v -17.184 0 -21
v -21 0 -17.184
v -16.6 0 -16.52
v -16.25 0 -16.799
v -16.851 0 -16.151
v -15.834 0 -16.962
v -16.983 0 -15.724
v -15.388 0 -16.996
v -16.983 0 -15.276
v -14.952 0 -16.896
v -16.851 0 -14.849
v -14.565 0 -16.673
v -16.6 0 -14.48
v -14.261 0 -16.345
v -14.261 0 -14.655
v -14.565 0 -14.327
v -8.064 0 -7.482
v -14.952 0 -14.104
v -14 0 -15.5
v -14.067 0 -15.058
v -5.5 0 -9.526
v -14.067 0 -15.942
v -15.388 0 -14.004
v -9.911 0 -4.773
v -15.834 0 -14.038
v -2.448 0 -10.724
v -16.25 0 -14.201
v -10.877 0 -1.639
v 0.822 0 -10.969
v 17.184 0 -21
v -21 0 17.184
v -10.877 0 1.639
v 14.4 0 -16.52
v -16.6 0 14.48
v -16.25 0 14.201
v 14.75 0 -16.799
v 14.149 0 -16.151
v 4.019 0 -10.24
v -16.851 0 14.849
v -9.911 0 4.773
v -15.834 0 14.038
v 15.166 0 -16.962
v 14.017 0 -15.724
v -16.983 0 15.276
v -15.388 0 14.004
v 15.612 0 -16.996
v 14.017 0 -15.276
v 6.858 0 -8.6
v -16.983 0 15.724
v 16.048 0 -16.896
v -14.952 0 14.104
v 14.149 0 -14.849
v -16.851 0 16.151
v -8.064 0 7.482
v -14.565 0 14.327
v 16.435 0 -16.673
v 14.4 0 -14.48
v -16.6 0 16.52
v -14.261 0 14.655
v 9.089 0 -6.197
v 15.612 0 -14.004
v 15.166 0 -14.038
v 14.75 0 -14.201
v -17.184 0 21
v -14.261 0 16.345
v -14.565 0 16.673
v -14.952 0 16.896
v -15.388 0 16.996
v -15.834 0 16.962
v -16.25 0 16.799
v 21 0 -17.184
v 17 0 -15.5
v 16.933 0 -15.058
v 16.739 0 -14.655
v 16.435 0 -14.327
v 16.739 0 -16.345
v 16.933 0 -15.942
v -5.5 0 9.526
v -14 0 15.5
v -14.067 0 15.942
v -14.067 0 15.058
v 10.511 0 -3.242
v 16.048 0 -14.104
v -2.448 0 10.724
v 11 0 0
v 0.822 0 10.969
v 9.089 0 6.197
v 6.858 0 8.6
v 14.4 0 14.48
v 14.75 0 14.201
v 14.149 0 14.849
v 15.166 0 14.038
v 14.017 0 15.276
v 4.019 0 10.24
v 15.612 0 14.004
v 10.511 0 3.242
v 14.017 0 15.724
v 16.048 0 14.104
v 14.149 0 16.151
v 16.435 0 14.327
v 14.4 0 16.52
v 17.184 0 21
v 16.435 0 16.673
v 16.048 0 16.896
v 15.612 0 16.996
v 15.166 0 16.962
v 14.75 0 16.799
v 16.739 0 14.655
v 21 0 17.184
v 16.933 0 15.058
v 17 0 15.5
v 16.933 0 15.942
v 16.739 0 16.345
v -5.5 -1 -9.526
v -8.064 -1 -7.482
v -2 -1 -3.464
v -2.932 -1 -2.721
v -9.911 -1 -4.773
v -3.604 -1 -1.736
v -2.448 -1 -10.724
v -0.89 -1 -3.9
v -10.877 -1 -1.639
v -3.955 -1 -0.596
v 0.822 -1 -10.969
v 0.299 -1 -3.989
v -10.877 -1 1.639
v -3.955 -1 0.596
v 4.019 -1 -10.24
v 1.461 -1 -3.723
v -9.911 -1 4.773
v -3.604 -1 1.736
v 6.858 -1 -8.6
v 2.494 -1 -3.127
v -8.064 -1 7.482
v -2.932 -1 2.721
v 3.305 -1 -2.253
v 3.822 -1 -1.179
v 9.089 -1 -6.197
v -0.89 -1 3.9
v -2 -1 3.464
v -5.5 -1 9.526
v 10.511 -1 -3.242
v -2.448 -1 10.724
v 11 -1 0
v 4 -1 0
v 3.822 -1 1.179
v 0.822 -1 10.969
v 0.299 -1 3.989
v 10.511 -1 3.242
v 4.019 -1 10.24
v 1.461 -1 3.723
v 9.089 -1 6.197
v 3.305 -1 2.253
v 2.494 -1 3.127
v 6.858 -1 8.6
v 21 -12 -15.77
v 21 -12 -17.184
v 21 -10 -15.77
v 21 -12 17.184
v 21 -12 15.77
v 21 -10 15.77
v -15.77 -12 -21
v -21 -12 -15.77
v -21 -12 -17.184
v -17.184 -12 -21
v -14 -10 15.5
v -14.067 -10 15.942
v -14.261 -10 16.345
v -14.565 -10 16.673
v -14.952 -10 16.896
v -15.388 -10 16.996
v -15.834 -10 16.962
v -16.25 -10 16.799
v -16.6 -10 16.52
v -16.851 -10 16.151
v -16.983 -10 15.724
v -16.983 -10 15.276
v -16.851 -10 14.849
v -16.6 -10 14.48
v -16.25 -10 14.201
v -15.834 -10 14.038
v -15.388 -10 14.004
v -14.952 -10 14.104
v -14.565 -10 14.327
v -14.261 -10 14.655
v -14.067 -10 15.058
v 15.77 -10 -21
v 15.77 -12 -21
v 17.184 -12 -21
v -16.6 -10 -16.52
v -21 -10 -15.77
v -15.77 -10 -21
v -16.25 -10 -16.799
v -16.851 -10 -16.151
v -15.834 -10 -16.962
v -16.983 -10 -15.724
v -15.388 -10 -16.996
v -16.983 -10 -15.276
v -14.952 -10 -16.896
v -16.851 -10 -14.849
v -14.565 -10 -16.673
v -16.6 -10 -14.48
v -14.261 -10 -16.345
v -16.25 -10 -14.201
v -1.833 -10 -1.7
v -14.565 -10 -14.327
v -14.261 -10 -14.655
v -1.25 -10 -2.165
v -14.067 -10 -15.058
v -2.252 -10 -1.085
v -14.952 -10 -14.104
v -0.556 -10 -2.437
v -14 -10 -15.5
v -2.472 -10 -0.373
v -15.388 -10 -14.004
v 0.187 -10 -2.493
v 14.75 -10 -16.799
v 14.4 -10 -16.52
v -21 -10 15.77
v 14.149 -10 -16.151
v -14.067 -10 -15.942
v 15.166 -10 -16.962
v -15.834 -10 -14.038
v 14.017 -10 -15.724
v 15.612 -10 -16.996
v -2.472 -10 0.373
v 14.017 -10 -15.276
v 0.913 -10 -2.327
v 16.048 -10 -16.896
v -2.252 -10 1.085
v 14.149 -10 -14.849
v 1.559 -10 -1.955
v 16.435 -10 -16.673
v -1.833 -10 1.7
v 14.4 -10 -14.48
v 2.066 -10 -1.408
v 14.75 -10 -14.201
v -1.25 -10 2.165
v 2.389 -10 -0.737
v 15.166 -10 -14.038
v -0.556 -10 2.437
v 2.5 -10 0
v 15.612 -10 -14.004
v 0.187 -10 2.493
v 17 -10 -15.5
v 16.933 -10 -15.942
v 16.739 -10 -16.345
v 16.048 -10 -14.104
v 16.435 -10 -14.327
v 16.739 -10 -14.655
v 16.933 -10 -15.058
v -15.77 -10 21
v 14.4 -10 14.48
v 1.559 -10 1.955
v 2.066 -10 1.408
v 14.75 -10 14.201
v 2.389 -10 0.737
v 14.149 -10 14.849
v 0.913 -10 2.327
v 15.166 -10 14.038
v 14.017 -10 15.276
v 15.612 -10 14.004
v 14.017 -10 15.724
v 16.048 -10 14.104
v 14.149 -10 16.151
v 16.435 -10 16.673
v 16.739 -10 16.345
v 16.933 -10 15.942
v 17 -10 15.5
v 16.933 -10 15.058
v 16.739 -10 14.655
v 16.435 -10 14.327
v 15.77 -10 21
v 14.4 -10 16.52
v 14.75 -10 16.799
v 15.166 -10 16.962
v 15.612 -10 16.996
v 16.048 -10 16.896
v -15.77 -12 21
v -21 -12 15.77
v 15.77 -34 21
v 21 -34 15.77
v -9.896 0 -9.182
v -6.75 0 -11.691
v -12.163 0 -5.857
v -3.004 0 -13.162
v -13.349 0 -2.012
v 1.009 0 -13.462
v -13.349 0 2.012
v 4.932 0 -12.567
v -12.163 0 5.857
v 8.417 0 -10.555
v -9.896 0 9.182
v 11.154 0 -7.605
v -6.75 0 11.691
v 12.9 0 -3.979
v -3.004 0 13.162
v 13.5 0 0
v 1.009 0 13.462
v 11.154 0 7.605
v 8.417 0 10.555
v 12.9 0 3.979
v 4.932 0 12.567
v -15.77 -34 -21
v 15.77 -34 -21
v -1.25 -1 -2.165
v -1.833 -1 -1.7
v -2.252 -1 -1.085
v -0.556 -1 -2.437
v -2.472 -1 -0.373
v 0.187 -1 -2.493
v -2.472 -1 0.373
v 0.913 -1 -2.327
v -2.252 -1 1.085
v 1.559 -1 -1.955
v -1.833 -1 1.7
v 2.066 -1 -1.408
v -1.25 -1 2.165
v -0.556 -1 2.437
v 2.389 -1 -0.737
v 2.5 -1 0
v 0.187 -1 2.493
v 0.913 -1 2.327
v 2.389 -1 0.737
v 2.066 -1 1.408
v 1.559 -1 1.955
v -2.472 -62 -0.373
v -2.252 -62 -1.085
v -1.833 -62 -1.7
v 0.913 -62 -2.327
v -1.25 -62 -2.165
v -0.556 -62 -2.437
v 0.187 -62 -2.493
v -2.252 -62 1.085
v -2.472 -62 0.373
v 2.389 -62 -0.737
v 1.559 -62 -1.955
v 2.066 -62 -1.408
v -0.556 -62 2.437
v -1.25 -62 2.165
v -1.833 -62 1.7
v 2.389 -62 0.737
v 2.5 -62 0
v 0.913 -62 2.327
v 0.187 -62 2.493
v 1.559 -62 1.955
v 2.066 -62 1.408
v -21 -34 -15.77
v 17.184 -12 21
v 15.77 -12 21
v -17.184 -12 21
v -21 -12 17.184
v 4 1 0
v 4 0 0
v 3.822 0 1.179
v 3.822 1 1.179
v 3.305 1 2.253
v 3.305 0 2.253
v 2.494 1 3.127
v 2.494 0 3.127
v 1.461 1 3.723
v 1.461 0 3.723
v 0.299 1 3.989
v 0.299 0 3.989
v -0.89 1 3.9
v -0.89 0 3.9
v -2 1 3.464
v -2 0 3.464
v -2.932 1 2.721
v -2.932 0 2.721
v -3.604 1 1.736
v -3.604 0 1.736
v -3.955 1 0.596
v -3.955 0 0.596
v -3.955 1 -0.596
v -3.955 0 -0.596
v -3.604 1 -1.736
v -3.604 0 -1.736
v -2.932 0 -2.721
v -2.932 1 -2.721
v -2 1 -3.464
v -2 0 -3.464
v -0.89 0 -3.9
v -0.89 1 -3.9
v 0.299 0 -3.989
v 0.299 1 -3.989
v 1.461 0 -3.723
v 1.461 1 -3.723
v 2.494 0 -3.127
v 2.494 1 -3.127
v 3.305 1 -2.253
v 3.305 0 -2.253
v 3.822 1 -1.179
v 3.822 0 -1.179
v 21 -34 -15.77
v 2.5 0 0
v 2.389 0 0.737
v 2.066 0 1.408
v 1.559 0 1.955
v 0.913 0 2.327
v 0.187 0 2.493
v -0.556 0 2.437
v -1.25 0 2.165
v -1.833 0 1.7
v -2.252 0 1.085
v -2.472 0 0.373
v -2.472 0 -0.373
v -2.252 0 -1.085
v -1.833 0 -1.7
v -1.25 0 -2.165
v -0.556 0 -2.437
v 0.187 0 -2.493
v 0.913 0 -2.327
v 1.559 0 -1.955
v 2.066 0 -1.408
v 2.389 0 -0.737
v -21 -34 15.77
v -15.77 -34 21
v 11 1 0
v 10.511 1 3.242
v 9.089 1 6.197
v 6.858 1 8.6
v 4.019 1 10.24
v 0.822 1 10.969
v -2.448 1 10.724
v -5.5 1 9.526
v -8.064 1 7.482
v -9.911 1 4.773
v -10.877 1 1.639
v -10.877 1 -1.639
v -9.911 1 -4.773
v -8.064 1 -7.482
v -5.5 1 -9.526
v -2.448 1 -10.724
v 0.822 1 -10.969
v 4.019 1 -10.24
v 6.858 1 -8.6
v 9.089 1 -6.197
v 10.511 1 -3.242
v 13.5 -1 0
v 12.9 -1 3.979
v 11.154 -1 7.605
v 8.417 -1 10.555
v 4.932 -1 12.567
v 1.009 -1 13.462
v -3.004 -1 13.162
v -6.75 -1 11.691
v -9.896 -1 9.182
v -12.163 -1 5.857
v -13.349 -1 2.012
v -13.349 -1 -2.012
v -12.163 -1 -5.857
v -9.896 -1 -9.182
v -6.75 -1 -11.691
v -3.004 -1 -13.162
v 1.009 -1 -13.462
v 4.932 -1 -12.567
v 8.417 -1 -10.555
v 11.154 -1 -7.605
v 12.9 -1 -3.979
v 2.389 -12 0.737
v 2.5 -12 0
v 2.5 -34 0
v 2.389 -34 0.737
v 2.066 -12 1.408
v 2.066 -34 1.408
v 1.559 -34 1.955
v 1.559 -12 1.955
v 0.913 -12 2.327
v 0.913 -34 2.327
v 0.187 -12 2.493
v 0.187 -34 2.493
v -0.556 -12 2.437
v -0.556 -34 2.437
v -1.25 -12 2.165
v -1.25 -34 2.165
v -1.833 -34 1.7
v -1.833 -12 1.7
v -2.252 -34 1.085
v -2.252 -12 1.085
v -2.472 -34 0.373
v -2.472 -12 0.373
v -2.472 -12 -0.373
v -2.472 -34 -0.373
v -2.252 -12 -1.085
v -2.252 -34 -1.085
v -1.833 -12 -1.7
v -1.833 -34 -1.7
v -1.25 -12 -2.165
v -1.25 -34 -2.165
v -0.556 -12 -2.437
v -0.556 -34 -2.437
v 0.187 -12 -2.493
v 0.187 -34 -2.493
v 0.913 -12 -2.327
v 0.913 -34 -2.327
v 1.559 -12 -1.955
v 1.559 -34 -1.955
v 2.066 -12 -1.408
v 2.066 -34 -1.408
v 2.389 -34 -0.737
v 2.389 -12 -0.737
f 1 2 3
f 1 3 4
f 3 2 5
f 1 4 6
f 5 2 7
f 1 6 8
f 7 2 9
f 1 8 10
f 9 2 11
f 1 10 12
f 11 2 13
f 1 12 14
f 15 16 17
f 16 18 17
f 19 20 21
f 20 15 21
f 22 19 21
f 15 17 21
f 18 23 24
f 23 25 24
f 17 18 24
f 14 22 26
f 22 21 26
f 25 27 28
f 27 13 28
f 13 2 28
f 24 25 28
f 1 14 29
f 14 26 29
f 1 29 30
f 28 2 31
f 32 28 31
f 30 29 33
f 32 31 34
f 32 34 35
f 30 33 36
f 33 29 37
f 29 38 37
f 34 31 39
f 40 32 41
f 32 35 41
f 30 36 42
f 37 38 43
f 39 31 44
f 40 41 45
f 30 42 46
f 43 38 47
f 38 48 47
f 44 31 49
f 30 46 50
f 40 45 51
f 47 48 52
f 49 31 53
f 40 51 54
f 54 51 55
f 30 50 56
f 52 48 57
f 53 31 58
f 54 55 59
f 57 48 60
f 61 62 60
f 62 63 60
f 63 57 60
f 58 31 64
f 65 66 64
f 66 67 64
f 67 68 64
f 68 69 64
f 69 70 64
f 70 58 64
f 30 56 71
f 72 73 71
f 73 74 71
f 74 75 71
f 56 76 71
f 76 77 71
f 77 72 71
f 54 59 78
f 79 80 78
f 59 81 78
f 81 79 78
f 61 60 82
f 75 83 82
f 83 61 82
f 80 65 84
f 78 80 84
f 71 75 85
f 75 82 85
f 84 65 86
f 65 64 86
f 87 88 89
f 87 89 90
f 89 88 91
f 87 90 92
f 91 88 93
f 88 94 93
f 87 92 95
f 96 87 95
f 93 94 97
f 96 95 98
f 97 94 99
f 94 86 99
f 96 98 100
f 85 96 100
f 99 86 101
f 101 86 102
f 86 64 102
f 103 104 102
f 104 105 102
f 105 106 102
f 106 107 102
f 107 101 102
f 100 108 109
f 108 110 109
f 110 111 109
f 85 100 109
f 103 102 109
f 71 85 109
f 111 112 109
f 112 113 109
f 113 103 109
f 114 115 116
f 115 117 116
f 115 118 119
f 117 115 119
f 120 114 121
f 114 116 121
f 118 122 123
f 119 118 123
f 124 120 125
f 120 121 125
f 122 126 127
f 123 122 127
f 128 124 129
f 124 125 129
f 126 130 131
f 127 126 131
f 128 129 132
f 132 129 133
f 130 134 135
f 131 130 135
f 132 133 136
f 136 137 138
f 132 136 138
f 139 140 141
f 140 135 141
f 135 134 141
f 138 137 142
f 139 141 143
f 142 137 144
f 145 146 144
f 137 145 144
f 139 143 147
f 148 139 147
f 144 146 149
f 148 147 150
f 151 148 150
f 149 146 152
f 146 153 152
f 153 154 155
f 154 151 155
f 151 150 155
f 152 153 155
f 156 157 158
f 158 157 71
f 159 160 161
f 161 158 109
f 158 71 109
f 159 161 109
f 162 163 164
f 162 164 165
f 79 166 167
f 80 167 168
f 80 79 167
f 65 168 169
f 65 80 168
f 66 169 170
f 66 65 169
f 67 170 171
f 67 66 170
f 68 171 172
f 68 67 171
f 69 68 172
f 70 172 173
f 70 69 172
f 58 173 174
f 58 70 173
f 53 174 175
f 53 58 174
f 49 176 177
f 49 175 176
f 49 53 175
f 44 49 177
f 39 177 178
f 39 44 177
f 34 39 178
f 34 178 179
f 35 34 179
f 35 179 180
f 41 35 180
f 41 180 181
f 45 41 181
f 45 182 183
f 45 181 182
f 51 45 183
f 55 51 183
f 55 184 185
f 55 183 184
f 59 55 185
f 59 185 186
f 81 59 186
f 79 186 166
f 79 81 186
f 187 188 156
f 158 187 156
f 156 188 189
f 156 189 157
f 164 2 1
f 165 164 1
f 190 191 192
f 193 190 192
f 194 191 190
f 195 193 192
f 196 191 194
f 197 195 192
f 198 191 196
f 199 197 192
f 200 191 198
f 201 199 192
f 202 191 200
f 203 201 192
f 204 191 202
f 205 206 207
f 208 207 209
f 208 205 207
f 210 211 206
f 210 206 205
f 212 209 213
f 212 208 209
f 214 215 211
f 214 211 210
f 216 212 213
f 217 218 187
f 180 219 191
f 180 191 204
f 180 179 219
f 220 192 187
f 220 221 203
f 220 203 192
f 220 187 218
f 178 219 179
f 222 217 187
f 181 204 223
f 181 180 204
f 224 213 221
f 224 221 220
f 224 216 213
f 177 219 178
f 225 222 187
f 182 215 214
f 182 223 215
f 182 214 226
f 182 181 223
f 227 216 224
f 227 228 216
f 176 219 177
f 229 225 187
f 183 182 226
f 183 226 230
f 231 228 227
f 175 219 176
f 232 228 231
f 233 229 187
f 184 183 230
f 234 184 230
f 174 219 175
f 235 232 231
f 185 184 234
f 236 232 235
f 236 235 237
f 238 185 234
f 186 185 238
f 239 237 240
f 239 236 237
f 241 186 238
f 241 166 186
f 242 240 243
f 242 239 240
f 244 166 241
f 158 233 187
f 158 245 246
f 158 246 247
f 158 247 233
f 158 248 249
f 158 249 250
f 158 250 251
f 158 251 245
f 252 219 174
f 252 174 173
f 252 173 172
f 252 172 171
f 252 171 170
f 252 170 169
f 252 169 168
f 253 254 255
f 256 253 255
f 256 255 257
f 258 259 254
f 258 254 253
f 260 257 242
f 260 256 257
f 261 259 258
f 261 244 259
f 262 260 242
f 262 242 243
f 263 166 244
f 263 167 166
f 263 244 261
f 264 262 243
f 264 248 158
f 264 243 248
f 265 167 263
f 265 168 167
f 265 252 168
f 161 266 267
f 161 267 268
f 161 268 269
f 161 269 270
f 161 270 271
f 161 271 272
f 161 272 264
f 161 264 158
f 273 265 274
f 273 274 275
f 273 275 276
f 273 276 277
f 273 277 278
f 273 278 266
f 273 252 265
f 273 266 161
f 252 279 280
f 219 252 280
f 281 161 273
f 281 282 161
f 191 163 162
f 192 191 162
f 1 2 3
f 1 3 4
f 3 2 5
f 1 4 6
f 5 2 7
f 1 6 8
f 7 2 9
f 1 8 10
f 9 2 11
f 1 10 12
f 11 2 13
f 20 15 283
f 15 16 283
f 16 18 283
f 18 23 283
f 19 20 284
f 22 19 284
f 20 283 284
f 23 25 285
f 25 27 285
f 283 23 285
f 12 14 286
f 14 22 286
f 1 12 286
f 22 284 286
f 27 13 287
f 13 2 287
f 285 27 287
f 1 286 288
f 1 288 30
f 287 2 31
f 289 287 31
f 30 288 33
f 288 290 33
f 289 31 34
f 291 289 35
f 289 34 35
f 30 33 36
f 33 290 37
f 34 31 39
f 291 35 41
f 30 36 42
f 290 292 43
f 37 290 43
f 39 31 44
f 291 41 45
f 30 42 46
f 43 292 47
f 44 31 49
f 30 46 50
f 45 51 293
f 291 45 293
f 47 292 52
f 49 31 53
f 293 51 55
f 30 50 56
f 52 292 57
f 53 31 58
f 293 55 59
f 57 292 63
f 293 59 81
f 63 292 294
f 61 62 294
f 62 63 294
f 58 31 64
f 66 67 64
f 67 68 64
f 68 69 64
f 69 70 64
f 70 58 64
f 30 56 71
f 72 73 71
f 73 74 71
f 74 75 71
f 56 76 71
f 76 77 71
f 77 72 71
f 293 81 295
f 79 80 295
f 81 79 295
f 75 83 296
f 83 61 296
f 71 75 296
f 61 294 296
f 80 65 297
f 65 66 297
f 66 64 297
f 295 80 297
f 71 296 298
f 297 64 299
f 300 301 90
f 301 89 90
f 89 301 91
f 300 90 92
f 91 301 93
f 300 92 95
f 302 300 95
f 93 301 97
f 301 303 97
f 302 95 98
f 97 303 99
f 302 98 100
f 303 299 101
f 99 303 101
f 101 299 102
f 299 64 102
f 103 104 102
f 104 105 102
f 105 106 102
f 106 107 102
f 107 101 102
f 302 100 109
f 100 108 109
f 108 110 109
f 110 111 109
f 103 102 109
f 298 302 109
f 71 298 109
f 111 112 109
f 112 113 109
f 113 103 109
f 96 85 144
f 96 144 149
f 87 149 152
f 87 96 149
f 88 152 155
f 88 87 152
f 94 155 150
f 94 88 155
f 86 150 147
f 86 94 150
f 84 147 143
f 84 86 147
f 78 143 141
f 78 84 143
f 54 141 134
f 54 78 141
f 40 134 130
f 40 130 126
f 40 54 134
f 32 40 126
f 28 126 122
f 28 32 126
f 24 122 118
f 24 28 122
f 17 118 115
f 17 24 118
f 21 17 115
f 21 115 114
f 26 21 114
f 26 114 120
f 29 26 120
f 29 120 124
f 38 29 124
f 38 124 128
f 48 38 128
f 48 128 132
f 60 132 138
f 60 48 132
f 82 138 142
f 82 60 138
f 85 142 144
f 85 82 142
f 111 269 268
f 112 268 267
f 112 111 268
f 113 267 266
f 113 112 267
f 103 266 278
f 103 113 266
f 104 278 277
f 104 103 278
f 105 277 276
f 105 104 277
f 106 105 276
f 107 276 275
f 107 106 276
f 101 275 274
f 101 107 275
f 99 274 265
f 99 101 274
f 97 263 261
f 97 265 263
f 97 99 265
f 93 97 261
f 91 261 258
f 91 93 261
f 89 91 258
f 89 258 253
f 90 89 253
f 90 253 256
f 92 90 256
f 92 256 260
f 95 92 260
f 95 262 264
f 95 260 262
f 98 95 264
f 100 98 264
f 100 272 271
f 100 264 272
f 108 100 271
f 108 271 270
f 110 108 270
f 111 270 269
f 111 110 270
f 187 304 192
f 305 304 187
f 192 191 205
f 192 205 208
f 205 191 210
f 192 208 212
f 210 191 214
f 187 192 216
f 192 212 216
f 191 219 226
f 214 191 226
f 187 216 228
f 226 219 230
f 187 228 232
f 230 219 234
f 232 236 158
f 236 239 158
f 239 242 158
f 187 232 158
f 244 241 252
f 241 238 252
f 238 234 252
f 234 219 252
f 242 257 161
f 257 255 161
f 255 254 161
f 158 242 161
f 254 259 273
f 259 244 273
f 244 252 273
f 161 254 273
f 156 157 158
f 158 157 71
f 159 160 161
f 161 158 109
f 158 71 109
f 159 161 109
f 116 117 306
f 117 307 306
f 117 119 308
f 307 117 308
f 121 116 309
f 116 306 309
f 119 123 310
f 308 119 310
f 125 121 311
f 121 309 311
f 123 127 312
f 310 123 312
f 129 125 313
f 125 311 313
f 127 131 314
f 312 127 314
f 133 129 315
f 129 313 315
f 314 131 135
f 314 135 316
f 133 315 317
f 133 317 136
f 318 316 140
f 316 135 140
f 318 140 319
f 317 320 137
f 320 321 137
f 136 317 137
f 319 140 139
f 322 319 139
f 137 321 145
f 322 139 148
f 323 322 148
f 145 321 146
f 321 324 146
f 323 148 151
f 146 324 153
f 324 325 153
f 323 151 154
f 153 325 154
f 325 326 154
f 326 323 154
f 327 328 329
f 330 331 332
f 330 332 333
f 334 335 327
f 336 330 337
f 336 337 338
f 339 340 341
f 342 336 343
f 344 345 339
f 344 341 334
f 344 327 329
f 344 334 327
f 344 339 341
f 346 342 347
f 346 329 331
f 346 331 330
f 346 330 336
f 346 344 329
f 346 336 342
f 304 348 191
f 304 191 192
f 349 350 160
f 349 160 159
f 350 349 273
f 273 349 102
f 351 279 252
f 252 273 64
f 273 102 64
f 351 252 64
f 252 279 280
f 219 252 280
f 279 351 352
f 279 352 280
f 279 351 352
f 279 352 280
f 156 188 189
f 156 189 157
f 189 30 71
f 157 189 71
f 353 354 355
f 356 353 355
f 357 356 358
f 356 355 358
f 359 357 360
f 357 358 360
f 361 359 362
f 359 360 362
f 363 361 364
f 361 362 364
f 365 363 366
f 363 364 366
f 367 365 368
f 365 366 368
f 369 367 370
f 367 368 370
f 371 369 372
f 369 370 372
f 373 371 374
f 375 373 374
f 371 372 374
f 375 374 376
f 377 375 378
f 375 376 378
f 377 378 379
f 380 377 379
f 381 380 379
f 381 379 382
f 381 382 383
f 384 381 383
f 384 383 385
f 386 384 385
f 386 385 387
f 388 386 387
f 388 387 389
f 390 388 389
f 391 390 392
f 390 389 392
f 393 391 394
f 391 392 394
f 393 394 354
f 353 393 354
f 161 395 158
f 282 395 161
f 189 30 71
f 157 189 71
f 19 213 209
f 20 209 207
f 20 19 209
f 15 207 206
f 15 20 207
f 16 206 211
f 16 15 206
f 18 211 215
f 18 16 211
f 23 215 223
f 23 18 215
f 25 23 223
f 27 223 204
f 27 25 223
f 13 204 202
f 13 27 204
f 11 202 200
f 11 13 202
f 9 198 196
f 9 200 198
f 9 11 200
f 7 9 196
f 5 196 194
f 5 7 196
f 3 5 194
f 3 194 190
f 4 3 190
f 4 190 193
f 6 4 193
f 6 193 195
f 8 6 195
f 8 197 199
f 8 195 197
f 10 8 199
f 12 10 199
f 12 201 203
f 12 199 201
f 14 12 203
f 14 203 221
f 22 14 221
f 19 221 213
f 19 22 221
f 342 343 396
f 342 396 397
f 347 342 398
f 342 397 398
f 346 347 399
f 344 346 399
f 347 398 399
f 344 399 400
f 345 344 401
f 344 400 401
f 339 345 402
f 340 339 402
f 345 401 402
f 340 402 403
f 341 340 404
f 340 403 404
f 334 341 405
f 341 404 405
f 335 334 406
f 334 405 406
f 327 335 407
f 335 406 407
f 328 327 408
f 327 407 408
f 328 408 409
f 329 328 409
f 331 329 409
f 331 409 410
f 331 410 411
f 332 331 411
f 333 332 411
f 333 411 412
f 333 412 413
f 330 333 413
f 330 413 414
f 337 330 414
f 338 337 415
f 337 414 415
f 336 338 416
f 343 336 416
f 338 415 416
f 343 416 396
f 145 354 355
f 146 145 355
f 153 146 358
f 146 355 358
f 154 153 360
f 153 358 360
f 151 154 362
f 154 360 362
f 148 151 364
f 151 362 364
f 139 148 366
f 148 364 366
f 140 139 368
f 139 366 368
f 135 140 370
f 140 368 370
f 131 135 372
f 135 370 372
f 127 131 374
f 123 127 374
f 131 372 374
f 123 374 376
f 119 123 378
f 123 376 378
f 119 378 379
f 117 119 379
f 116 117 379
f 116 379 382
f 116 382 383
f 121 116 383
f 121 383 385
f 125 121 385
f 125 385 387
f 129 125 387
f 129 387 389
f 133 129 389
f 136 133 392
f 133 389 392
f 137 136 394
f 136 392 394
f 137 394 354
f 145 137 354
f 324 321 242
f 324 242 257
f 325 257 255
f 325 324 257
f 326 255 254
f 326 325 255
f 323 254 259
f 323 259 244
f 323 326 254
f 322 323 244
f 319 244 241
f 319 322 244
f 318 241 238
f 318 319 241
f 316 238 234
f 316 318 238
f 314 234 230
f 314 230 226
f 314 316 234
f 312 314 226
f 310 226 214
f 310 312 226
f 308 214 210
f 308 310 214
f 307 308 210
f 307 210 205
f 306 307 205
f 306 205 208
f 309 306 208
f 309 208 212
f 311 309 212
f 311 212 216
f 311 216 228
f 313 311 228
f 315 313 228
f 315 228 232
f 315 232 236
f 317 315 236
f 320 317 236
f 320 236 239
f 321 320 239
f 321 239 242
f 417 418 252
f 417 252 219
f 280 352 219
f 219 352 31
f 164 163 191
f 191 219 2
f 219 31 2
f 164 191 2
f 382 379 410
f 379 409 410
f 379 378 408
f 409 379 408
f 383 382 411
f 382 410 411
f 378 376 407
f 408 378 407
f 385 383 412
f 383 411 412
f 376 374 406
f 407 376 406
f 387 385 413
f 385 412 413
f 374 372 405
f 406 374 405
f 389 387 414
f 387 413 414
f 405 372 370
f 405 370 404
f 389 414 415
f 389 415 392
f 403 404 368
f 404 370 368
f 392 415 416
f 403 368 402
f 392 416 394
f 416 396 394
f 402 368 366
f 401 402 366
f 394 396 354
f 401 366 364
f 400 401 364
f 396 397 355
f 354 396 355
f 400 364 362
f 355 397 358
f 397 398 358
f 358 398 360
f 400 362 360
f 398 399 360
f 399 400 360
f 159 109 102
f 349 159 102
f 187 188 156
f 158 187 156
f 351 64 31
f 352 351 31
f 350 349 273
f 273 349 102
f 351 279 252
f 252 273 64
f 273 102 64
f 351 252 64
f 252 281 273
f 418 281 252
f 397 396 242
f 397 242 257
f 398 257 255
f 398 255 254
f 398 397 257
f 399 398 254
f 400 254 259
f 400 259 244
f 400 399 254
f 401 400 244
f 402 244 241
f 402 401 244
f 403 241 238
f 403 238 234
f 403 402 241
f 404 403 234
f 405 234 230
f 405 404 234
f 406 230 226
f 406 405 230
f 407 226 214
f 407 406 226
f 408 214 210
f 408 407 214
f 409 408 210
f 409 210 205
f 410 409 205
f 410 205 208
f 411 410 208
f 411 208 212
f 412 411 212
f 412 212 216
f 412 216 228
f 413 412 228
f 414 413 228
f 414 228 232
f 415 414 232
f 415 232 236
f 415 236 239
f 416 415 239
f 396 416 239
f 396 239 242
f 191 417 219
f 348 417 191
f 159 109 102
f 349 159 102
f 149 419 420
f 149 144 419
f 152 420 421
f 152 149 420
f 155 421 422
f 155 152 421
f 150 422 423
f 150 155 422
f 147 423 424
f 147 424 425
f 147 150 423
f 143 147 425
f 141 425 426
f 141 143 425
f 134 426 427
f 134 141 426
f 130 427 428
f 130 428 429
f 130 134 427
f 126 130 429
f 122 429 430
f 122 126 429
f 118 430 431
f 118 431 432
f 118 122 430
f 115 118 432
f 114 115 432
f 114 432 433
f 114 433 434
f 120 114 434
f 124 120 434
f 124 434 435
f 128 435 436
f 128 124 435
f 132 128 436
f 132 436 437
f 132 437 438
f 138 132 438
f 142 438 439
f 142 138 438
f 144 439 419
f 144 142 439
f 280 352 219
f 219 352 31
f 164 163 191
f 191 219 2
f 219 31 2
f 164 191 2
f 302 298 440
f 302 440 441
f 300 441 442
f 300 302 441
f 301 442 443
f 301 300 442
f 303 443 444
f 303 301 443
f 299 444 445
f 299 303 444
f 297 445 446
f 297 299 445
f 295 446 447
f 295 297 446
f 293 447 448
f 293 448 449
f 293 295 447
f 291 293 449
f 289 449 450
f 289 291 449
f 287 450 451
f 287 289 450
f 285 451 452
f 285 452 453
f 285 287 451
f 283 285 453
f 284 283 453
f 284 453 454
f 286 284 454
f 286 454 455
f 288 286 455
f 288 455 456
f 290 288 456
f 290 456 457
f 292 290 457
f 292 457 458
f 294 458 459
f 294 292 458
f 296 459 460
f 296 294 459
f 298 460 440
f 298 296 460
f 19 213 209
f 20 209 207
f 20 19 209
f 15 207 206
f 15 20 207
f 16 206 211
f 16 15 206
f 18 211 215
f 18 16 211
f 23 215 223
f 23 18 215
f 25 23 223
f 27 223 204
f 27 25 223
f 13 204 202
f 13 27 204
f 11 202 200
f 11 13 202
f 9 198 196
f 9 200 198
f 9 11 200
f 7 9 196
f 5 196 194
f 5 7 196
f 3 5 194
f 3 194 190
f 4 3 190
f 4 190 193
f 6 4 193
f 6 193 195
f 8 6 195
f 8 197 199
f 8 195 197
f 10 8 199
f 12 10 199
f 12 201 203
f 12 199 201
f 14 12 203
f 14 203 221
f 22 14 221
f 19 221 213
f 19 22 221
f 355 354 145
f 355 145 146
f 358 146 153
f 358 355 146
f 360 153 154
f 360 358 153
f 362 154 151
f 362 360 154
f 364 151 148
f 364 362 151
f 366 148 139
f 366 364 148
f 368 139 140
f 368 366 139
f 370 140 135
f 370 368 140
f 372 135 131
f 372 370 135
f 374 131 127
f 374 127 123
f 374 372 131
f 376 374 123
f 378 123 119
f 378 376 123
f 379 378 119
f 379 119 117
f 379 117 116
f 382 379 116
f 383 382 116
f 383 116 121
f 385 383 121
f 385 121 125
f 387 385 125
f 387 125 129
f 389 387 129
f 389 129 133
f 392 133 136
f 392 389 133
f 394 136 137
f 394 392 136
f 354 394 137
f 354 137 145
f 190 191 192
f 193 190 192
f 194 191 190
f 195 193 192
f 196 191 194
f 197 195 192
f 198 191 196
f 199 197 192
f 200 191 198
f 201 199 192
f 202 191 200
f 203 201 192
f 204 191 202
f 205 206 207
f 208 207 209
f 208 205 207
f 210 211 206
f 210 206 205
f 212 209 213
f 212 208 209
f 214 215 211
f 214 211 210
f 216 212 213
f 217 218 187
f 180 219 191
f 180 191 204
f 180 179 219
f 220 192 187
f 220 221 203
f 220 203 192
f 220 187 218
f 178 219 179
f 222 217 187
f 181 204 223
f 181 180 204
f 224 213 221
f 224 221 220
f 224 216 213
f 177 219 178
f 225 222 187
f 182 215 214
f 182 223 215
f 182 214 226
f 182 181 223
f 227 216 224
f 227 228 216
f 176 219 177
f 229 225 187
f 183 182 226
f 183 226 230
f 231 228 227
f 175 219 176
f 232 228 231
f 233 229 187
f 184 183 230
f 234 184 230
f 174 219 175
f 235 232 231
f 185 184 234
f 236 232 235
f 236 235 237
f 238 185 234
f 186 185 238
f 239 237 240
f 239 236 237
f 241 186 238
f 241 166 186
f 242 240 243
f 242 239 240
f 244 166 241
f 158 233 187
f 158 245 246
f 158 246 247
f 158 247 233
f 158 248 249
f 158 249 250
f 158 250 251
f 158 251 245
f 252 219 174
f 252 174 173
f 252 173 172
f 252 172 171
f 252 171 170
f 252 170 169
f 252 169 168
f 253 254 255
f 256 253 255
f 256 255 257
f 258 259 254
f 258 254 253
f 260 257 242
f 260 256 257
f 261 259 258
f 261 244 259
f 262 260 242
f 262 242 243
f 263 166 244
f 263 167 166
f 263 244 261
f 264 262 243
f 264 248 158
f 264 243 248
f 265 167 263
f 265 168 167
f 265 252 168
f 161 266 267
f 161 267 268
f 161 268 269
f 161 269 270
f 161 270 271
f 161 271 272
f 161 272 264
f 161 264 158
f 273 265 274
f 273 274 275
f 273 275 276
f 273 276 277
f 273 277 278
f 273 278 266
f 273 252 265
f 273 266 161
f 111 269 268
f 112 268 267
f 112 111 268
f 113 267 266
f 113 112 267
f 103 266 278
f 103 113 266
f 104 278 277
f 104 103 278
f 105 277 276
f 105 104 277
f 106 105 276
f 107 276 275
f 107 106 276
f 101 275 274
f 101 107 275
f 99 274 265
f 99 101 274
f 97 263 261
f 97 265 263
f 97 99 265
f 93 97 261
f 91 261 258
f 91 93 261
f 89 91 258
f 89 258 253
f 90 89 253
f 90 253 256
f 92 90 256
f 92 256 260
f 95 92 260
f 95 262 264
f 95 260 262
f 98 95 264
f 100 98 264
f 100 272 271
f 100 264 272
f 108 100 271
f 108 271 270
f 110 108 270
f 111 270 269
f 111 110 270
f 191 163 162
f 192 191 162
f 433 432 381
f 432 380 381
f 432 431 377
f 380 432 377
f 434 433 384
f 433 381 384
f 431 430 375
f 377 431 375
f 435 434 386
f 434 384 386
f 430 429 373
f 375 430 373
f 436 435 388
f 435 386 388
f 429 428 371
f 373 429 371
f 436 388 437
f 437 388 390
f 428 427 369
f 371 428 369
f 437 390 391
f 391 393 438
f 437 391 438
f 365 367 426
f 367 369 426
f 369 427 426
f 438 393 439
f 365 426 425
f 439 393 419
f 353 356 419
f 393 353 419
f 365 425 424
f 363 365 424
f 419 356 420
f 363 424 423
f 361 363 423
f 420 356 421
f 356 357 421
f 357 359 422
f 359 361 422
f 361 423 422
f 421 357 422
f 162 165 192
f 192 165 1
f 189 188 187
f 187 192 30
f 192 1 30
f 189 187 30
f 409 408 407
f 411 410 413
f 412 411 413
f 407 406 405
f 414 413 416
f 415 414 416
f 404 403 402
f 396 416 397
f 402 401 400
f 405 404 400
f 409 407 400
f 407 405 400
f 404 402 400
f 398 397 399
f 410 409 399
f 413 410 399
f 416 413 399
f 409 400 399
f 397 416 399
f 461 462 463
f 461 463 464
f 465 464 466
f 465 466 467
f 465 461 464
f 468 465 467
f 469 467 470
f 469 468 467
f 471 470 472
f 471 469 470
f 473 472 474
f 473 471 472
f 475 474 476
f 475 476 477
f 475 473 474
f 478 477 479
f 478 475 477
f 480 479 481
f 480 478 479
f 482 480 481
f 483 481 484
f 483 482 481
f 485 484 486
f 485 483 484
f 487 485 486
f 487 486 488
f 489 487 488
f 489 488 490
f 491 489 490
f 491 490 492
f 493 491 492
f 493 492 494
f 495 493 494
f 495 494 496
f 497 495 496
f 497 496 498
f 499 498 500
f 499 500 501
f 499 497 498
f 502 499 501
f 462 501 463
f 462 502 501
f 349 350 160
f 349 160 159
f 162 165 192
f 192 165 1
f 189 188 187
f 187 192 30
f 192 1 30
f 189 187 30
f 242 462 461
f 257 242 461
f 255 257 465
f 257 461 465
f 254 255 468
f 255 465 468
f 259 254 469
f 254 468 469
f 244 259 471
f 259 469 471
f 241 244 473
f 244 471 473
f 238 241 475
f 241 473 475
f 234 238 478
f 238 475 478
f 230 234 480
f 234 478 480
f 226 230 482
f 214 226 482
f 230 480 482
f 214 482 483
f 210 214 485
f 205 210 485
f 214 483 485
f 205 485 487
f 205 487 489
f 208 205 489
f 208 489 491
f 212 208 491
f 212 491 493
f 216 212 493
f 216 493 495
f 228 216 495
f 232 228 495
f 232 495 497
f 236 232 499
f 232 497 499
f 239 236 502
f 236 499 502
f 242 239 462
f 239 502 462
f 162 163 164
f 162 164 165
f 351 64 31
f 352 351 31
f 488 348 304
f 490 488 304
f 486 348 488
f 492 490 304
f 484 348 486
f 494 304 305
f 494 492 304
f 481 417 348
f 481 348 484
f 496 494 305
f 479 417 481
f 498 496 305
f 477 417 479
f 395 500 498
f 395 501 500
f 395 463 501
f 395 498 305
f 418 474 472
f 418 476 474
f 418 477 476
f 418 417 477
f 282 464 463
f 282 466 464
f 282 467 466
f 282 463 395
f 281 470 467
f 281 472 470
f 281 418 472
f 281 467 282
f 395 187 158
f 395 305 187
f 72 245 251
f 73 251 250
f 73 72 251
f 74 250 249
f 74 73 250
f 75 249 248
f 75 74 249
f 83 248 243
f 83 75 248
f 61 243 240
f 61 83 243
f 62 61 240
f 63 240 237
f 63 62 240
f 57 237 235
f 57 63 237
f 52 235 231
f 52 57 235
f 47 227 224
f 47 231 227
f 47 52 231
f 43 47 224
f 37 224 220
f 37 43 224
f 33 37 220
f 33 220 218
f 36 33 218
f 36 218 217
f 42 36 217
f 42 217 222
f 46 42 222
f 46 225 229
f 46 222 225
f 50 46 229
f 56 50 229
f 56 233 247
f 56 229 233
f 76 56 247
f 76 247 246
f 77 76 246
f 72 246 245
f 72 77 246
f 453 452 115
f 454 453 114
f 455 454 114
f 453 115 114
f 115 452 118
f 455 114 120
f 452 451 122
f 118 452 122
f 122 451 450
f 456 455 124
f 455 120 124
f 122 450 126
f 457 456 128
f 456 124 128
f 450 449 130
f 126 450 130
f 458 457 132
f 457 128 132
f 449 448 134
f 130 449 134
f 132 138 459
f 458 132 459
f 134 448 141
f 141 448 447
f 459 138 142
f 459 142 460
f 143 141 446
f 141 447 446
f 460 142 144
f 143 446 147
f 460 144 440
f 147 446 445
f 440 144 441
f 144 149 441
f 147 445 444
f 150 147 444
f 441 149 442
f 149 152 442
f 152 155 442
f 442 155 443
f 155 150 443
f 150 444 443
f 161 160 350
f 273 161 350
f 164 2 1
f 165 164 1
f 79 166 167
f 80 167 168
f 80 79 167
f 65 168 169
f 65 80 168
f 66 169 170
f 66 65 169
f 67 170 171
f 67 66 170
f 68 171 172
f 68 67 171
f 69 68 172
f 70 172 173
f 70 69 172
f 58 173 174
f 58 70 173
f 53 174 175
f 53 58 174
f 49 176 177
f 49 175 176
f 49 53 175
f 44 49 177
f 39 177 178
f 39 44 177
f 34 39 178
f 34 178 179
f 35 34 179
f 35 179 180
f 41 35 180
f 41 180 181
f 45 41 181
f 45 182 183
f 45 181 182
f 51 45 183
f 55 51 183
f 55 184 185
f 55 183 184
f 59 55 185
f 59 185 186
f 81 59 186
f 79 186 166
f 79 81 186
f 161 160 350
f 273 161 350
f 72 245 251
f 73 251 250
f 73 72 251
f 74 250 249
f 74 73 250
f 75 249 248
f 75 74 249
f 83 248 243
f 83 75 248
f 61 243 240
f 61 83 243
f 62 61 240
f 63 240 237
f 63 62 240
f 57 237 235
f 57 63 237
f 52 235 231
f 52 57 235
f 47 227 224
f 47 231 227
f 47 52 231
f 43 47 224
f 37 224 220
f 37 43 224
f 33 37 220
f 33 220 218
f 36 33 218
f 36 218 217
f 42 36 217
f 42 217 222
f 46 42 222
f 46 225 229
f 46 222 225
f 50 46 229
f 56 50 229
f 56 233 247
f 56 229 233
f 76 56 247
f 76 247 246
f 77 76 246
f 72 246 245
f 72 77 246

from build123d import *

# Parameters (mm, degrees)
F0_R          = 1.5
F0_R_2        = 13.5
F0_R_3        = 11
F0_R_4        = 4
F0_R_5        = 2.5
F1_DEPTH      = 12
F2_DEPTH      = 1
F3_DEPTH      = 1
F4_DEPTH      = 20
F5_R          = 2.5
F6_DEPTH      = 2
F7_DEPTH      = 22
F7_DEPTH_BACK = 2
F8_DEPTH      = 12
F9_DEPTH      = 1
F10_DEPTH     = 2
F11_DEPTH     = 62


with BuildPart() as f1:
    # F0 (on Front) → F1 (new body)
    with BuildSketch(Plane.XZ):
        Polygon((17.1837661841, 21), (-17.1837661841, 21), (-21, 17.1837661841), (-21, -17.1837661841), (-17.1837661841, -21), (17.1837661841, -21), (21, -17.1837661841), (21, 17.1837661841), align=None)
        with Locations((-15.5, -15.5)):
            Circle(F0_R, mode=Mode.SUBTRACT)
        with Locations((15.5, -15.5)):
            Circle(F0_R, mode=Mode.SUBTRACT)
        with Locations((-15.5, 15.5)):
            Circle(F0_R, mode=Mode.SUBTRACT)
        Circle(F0_R_2, mode=Mode.SUBTRACT)
        with Locations((15.5, 15.5)):
            Circle(F0_R, mode=Mode.SUBTRACT)
        Circle(F0_R_2)
        Circle(F0_R_3, mode=Mode.SUBTRACT)
        Circle(F0_R_3)
        Circle(F0_R_4, mode=Mode.SUBTRACT)
        Circle(F0_R_4)
        Circle(F0_R_5, mode=Mode.SUBTRACT)
        Circle(F0_R_5)
    extrude(amount=F1_DEPTH)

    # F0 (on Front) → F2 (cut)
    with BuildSketch(Plane.XZ):
        Circle(F0_R_2)
        Circle(F0_R_3, mode=Mode.SUBTRACT)
        Circle(F0_R_4)
        Circle(F0_R_5, mode=Mode.SUBTRACT)
    extrude(amount=F2_DEPTH, mode=Mode.SUBTRACT)

    # F0 (on Front) → F3 (join)
    with BuildSketch(Plane.XZ):
        Circle(F0_R_3)
        Circle(F0_R_4, mode=Mode.SUBTRACT)
    extrude(amount=-F3_DEPTH)

    # F0 (on Front) → F4 (cut)
    with BuildSketch(Plane.XZ):
        Circle(F0_R_5)
    extrude(amount=F4_DEPTH, mode=Mode.SUBTRACT)

    # F5 (on face) → F6 (cut)
    with BuildSketch(Plane.XZ.offset(12)):
        Polygon((21, 15.7695526217), (15.7695526217, 21), (-15.7695526217, 21), (-21, 15.7695526217), (-21, -15.7695526217), (-15.7695526217, -21), (15.7695526217, -21), (21, -15.7695526217), align=None)
        Circle(F5_R, mode=Mode.SUBTRACT)
    extrude(amount=-F6_DEPTH, mode=Mode.SUBTRACT)


with BuildPart() as f7:
    # F5 (on face) → F7 (new body, two sides)
    with BuildSketch(Plane.XZ.offset(12)) as f7_sk:
        Polygon((21, 15.7695526217), (15.7695526217, 21), (-15.7695526217, 21), (-21, 15.7695526217), (-21, -15.7695526217), (-15.7695526217, -21), (15.7695526217, -21), (21, -15.7695526217), align=None)
        Circle(F5_R, mode=Mode.SUBTRACT)
    extrude(amount=F7_DEPTH)
    extrude(f7_sk.sketch, amount=-F7_DEPTH_BACK)


with BuildPart() as f8:
    # F0 (on Front) → F8 (new body)
    with BuildSketch(Plane.XZ):
        Polygon((17.1837661841, 21), (-17.1837661841, 21), (-21, 17.1837661841), (-21, -17.1837661841), (-17.1837661841, -21), (17.1837661841, -21), (21, -17.1837661841), (21, 17.1837661841), align=None)
        with Locations((-15.5, -15.5)):
            Circle(F0_R, mode=Mode.SUBTRACT)
        with Locations((15.5, -15.5)):
            Circle(F0_R, mode=Mode.SUBTRACT)
        with Locations((-15.5, 15.5)):
            Circle(F0_R, mode=Mode.SUBTRACT)
        Circle(F0_R_2, mode=Mode.SUBTRACT)
        with Locations((15.5, 15.5)):
            Circle(F0_R, mode=Mode.SUBTRACT)
        Circle(F0_R_2)
        Circle(F0_R_3, mode=Mode.SUBTRACT)
        Circle(F0_R_3)
        Circle(F0_R_4, mode=Mode.SUBTRACT)
        Circle(F0_R_4)
        Circle(F0_R_5, mode=Mode.SUBTRACT)
    extrude(amount=F8_DEPTH)

    # F0 (on Front) → F9 (cut)
    with BuildSketch(Plane.XZ):
        Circle(F0_R_3)
        Circle(F0_R_4, mode=Mode.SUBTRACT)
    extrude(amount=F9_DEPTH, mode=Mode.SUBTRACT)

    # F5 (on face) → F10 (cut)
    with BuildSketch(Plane.XZ.offset(12)):
        Polygon((21, 15.7695526217), (15.7695526217, 21), (-15.7695526217, 21), (-21, 15.7695526217), (-21, -15.7695526217), (-15.7695526217, -21), (15.7695526217, -21), (21, -15.7695526217), align=None)
        Circle(F5_R, mode=Mode.SUBTRACT)
    extrude(amount=-F10_DEPTH, mode=Mode.SUBTRACT)


with BuildPart() as f11:
    # F0 (on Front) → F11 (new body)
    with BuildSketch(Plane.XZ):
        Circle(F0_R_5)
    extrude(amount=F11_DEPTH)


solid = Compound([f1.part, f7.part, f8.part, f11.part])
